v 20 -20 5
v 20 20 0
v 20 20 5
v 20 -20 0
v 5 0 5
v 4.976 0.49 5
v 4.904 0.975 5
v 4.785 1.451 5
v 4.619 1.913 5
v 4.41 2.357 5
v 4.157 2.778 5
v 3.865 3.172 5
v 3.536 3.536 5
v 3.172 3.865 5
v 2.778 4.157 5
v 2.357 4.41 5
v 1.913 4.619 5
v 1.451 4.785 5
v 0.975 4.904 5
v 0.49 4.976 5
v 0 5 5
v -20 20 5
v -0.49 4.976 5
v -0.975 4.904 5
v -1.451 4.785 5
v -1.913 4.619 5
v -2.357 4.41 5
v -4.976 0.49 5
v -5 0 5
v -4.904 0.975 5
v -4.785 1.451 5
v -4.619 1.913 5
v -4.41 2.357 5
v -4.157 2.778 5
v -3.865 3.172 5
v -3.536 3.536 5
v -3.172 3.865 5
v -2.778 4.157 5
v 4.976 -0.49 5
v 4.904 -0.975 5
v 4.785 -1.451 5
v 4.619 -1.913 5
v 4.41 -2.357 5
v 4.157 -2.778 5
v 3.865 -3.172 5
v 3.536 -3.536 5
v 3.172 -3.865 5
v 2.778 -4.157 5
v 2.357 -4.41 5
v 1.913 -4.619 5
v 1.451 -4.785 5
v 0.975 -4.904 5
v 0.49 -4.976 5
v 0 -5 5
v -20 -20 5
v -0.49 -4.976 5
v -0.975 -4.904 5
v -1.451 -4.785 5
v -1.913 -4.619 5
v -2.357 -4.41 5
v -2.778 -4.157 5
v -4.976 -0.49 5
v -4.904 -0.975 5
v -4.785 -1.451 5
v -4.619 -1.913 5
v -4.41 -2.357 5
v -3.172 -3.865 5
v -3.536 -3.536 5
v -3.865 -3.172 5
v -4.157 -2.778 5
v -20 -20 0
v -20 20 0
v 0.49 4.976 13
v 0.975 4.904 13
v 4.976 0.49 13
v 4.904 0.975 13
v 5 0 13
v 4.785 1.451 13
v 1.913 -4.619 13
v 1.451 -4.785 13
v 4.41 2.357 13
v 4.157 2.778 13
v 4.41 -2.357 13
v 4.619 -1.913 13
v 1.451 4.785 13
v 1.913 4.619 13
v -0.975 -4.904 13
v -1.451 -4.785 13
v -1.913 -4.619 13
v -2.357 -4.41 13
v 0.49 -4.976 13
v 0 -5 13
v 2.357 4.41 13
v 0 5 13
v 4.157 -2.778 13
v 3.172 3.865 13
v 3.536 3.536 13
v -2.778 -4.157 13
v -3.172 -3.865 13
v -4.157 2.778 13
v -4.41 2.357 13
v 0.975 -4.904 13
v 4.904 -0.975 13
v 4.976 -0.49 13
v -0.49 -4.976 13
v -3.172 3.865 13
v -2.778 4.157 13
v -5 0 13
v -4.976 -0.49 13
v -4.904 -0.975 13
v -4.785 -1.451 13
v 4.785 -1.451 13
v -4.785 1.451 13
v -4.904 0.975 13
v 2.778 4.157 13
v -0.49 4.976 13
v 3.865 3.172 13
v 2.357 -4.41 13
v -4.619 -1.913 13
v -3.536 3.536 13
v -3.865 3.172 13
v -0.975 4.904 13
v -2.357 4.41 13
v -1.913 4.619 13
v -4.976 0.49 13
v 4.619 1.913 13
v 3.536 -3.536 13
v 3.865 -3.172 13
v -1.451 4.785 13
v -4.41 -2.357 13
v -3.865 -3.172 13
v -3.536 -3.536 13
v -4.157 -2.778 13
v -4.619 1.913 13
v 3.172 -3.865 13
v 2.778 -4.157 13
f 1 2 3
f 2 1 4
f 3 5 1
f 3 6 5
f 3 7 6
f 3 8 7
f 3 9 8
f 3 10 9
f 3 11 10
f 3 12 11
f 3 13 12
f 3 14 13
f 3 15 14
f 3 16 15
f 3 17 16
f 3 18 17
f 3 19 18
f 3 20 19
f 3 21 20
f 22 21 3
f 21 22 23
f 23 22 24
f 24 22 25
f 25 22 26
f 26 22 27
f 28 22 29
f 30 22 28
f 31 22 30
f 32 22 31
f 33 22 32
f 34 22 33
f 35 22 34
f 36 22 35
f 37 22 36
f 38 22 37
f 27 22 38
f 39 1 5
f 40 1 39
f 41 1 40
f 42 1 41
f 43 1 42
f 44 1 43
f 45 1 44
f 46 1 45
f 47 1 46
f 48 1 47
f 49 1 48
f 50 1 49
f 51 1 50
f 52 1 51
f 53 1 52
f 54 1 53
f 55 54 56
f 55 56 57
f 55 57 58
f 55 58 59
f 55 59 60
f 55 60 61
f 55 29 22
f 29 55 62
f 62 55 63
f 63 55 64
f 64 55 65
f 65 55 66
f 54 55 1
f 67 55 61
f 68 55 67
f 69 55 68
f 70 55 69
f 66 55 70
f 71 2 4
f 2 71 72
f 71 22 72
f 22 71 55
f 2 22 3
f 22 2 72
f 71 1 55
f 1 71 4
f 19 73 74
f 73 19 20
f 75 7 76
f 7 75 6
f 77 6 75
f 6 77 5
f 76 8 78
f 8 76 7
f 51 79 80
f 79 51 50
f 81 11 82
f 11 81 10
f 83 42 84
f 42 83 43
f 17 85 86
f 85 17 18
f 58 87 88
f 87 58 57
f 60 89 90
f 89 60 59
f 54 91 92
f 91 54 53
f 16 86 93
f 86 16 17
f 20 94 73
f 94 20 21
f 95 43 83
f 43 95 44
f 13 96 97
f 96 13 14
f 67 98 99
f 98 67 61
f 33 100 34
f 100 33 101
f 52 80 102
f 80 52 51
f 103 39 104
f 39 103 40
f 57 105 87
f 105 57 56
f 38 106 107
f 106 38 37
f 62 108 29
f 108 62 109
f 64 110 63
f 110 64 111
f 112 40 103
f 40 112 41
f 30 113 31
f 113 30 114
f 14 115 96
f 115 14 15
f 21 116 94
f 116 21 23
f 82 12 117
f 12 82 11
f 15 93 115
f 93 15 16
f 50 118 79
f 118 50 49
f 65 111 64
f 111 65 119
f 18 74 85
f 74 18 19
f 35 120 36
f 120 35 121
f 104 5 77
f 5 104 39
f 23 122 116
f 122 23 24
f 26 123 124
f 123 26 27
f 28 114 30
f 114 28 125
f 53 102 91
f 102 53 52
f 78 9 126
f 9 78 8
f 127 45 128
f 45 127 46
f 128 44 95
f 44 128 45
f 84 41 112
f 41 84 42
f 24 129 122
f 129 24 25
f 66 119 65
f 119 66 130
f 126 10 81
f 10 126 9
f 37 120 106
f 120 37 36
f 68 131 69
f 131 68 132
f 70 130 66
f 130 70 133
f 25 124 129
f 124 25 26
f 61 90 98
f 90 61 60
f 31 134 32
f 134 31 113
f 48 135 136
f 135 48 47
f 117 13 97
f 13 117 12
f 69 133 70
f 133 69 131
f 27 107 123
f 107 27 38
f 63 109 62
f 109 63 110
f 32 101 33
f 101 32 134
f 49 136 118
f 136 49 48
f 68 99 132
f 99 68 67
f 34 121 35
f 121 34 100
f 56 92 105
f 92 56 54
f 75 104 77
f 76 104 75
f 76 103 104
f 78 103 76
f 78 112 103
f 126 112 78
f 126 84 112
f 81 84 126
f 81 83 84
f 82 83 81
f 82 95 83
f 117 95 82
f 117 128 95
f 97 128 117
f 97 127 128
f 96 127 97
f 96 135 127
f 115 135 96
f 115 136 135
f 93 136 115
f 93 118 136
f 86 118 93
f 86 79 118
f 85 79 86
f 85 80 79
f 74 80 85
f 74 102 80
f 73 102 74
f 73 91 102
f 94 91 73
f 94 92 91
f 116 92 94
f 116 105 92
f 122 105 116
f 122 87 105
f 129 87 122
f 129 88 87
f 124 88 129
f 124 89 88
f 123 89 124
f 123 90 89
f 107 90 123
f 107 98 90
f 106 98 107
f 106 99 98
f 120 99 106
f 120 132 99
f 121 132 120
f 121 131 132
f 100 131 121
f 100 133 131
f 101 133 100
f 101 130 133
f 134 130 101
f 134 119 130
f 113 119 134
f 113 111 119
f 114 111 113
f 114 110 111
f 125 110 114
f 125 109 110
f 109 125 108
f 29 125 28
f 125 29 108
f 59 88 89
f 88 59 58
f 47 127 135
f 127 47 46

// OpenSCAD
// Assumption: plate centred on XY origin, bottom at Z=0.
$fn = 64;
union() {
    translate([-20, -20, 0]) cube([40, 40, 5]);
    translate([0, 0, 5]) cylinder(d = 10, h = 8);
}
